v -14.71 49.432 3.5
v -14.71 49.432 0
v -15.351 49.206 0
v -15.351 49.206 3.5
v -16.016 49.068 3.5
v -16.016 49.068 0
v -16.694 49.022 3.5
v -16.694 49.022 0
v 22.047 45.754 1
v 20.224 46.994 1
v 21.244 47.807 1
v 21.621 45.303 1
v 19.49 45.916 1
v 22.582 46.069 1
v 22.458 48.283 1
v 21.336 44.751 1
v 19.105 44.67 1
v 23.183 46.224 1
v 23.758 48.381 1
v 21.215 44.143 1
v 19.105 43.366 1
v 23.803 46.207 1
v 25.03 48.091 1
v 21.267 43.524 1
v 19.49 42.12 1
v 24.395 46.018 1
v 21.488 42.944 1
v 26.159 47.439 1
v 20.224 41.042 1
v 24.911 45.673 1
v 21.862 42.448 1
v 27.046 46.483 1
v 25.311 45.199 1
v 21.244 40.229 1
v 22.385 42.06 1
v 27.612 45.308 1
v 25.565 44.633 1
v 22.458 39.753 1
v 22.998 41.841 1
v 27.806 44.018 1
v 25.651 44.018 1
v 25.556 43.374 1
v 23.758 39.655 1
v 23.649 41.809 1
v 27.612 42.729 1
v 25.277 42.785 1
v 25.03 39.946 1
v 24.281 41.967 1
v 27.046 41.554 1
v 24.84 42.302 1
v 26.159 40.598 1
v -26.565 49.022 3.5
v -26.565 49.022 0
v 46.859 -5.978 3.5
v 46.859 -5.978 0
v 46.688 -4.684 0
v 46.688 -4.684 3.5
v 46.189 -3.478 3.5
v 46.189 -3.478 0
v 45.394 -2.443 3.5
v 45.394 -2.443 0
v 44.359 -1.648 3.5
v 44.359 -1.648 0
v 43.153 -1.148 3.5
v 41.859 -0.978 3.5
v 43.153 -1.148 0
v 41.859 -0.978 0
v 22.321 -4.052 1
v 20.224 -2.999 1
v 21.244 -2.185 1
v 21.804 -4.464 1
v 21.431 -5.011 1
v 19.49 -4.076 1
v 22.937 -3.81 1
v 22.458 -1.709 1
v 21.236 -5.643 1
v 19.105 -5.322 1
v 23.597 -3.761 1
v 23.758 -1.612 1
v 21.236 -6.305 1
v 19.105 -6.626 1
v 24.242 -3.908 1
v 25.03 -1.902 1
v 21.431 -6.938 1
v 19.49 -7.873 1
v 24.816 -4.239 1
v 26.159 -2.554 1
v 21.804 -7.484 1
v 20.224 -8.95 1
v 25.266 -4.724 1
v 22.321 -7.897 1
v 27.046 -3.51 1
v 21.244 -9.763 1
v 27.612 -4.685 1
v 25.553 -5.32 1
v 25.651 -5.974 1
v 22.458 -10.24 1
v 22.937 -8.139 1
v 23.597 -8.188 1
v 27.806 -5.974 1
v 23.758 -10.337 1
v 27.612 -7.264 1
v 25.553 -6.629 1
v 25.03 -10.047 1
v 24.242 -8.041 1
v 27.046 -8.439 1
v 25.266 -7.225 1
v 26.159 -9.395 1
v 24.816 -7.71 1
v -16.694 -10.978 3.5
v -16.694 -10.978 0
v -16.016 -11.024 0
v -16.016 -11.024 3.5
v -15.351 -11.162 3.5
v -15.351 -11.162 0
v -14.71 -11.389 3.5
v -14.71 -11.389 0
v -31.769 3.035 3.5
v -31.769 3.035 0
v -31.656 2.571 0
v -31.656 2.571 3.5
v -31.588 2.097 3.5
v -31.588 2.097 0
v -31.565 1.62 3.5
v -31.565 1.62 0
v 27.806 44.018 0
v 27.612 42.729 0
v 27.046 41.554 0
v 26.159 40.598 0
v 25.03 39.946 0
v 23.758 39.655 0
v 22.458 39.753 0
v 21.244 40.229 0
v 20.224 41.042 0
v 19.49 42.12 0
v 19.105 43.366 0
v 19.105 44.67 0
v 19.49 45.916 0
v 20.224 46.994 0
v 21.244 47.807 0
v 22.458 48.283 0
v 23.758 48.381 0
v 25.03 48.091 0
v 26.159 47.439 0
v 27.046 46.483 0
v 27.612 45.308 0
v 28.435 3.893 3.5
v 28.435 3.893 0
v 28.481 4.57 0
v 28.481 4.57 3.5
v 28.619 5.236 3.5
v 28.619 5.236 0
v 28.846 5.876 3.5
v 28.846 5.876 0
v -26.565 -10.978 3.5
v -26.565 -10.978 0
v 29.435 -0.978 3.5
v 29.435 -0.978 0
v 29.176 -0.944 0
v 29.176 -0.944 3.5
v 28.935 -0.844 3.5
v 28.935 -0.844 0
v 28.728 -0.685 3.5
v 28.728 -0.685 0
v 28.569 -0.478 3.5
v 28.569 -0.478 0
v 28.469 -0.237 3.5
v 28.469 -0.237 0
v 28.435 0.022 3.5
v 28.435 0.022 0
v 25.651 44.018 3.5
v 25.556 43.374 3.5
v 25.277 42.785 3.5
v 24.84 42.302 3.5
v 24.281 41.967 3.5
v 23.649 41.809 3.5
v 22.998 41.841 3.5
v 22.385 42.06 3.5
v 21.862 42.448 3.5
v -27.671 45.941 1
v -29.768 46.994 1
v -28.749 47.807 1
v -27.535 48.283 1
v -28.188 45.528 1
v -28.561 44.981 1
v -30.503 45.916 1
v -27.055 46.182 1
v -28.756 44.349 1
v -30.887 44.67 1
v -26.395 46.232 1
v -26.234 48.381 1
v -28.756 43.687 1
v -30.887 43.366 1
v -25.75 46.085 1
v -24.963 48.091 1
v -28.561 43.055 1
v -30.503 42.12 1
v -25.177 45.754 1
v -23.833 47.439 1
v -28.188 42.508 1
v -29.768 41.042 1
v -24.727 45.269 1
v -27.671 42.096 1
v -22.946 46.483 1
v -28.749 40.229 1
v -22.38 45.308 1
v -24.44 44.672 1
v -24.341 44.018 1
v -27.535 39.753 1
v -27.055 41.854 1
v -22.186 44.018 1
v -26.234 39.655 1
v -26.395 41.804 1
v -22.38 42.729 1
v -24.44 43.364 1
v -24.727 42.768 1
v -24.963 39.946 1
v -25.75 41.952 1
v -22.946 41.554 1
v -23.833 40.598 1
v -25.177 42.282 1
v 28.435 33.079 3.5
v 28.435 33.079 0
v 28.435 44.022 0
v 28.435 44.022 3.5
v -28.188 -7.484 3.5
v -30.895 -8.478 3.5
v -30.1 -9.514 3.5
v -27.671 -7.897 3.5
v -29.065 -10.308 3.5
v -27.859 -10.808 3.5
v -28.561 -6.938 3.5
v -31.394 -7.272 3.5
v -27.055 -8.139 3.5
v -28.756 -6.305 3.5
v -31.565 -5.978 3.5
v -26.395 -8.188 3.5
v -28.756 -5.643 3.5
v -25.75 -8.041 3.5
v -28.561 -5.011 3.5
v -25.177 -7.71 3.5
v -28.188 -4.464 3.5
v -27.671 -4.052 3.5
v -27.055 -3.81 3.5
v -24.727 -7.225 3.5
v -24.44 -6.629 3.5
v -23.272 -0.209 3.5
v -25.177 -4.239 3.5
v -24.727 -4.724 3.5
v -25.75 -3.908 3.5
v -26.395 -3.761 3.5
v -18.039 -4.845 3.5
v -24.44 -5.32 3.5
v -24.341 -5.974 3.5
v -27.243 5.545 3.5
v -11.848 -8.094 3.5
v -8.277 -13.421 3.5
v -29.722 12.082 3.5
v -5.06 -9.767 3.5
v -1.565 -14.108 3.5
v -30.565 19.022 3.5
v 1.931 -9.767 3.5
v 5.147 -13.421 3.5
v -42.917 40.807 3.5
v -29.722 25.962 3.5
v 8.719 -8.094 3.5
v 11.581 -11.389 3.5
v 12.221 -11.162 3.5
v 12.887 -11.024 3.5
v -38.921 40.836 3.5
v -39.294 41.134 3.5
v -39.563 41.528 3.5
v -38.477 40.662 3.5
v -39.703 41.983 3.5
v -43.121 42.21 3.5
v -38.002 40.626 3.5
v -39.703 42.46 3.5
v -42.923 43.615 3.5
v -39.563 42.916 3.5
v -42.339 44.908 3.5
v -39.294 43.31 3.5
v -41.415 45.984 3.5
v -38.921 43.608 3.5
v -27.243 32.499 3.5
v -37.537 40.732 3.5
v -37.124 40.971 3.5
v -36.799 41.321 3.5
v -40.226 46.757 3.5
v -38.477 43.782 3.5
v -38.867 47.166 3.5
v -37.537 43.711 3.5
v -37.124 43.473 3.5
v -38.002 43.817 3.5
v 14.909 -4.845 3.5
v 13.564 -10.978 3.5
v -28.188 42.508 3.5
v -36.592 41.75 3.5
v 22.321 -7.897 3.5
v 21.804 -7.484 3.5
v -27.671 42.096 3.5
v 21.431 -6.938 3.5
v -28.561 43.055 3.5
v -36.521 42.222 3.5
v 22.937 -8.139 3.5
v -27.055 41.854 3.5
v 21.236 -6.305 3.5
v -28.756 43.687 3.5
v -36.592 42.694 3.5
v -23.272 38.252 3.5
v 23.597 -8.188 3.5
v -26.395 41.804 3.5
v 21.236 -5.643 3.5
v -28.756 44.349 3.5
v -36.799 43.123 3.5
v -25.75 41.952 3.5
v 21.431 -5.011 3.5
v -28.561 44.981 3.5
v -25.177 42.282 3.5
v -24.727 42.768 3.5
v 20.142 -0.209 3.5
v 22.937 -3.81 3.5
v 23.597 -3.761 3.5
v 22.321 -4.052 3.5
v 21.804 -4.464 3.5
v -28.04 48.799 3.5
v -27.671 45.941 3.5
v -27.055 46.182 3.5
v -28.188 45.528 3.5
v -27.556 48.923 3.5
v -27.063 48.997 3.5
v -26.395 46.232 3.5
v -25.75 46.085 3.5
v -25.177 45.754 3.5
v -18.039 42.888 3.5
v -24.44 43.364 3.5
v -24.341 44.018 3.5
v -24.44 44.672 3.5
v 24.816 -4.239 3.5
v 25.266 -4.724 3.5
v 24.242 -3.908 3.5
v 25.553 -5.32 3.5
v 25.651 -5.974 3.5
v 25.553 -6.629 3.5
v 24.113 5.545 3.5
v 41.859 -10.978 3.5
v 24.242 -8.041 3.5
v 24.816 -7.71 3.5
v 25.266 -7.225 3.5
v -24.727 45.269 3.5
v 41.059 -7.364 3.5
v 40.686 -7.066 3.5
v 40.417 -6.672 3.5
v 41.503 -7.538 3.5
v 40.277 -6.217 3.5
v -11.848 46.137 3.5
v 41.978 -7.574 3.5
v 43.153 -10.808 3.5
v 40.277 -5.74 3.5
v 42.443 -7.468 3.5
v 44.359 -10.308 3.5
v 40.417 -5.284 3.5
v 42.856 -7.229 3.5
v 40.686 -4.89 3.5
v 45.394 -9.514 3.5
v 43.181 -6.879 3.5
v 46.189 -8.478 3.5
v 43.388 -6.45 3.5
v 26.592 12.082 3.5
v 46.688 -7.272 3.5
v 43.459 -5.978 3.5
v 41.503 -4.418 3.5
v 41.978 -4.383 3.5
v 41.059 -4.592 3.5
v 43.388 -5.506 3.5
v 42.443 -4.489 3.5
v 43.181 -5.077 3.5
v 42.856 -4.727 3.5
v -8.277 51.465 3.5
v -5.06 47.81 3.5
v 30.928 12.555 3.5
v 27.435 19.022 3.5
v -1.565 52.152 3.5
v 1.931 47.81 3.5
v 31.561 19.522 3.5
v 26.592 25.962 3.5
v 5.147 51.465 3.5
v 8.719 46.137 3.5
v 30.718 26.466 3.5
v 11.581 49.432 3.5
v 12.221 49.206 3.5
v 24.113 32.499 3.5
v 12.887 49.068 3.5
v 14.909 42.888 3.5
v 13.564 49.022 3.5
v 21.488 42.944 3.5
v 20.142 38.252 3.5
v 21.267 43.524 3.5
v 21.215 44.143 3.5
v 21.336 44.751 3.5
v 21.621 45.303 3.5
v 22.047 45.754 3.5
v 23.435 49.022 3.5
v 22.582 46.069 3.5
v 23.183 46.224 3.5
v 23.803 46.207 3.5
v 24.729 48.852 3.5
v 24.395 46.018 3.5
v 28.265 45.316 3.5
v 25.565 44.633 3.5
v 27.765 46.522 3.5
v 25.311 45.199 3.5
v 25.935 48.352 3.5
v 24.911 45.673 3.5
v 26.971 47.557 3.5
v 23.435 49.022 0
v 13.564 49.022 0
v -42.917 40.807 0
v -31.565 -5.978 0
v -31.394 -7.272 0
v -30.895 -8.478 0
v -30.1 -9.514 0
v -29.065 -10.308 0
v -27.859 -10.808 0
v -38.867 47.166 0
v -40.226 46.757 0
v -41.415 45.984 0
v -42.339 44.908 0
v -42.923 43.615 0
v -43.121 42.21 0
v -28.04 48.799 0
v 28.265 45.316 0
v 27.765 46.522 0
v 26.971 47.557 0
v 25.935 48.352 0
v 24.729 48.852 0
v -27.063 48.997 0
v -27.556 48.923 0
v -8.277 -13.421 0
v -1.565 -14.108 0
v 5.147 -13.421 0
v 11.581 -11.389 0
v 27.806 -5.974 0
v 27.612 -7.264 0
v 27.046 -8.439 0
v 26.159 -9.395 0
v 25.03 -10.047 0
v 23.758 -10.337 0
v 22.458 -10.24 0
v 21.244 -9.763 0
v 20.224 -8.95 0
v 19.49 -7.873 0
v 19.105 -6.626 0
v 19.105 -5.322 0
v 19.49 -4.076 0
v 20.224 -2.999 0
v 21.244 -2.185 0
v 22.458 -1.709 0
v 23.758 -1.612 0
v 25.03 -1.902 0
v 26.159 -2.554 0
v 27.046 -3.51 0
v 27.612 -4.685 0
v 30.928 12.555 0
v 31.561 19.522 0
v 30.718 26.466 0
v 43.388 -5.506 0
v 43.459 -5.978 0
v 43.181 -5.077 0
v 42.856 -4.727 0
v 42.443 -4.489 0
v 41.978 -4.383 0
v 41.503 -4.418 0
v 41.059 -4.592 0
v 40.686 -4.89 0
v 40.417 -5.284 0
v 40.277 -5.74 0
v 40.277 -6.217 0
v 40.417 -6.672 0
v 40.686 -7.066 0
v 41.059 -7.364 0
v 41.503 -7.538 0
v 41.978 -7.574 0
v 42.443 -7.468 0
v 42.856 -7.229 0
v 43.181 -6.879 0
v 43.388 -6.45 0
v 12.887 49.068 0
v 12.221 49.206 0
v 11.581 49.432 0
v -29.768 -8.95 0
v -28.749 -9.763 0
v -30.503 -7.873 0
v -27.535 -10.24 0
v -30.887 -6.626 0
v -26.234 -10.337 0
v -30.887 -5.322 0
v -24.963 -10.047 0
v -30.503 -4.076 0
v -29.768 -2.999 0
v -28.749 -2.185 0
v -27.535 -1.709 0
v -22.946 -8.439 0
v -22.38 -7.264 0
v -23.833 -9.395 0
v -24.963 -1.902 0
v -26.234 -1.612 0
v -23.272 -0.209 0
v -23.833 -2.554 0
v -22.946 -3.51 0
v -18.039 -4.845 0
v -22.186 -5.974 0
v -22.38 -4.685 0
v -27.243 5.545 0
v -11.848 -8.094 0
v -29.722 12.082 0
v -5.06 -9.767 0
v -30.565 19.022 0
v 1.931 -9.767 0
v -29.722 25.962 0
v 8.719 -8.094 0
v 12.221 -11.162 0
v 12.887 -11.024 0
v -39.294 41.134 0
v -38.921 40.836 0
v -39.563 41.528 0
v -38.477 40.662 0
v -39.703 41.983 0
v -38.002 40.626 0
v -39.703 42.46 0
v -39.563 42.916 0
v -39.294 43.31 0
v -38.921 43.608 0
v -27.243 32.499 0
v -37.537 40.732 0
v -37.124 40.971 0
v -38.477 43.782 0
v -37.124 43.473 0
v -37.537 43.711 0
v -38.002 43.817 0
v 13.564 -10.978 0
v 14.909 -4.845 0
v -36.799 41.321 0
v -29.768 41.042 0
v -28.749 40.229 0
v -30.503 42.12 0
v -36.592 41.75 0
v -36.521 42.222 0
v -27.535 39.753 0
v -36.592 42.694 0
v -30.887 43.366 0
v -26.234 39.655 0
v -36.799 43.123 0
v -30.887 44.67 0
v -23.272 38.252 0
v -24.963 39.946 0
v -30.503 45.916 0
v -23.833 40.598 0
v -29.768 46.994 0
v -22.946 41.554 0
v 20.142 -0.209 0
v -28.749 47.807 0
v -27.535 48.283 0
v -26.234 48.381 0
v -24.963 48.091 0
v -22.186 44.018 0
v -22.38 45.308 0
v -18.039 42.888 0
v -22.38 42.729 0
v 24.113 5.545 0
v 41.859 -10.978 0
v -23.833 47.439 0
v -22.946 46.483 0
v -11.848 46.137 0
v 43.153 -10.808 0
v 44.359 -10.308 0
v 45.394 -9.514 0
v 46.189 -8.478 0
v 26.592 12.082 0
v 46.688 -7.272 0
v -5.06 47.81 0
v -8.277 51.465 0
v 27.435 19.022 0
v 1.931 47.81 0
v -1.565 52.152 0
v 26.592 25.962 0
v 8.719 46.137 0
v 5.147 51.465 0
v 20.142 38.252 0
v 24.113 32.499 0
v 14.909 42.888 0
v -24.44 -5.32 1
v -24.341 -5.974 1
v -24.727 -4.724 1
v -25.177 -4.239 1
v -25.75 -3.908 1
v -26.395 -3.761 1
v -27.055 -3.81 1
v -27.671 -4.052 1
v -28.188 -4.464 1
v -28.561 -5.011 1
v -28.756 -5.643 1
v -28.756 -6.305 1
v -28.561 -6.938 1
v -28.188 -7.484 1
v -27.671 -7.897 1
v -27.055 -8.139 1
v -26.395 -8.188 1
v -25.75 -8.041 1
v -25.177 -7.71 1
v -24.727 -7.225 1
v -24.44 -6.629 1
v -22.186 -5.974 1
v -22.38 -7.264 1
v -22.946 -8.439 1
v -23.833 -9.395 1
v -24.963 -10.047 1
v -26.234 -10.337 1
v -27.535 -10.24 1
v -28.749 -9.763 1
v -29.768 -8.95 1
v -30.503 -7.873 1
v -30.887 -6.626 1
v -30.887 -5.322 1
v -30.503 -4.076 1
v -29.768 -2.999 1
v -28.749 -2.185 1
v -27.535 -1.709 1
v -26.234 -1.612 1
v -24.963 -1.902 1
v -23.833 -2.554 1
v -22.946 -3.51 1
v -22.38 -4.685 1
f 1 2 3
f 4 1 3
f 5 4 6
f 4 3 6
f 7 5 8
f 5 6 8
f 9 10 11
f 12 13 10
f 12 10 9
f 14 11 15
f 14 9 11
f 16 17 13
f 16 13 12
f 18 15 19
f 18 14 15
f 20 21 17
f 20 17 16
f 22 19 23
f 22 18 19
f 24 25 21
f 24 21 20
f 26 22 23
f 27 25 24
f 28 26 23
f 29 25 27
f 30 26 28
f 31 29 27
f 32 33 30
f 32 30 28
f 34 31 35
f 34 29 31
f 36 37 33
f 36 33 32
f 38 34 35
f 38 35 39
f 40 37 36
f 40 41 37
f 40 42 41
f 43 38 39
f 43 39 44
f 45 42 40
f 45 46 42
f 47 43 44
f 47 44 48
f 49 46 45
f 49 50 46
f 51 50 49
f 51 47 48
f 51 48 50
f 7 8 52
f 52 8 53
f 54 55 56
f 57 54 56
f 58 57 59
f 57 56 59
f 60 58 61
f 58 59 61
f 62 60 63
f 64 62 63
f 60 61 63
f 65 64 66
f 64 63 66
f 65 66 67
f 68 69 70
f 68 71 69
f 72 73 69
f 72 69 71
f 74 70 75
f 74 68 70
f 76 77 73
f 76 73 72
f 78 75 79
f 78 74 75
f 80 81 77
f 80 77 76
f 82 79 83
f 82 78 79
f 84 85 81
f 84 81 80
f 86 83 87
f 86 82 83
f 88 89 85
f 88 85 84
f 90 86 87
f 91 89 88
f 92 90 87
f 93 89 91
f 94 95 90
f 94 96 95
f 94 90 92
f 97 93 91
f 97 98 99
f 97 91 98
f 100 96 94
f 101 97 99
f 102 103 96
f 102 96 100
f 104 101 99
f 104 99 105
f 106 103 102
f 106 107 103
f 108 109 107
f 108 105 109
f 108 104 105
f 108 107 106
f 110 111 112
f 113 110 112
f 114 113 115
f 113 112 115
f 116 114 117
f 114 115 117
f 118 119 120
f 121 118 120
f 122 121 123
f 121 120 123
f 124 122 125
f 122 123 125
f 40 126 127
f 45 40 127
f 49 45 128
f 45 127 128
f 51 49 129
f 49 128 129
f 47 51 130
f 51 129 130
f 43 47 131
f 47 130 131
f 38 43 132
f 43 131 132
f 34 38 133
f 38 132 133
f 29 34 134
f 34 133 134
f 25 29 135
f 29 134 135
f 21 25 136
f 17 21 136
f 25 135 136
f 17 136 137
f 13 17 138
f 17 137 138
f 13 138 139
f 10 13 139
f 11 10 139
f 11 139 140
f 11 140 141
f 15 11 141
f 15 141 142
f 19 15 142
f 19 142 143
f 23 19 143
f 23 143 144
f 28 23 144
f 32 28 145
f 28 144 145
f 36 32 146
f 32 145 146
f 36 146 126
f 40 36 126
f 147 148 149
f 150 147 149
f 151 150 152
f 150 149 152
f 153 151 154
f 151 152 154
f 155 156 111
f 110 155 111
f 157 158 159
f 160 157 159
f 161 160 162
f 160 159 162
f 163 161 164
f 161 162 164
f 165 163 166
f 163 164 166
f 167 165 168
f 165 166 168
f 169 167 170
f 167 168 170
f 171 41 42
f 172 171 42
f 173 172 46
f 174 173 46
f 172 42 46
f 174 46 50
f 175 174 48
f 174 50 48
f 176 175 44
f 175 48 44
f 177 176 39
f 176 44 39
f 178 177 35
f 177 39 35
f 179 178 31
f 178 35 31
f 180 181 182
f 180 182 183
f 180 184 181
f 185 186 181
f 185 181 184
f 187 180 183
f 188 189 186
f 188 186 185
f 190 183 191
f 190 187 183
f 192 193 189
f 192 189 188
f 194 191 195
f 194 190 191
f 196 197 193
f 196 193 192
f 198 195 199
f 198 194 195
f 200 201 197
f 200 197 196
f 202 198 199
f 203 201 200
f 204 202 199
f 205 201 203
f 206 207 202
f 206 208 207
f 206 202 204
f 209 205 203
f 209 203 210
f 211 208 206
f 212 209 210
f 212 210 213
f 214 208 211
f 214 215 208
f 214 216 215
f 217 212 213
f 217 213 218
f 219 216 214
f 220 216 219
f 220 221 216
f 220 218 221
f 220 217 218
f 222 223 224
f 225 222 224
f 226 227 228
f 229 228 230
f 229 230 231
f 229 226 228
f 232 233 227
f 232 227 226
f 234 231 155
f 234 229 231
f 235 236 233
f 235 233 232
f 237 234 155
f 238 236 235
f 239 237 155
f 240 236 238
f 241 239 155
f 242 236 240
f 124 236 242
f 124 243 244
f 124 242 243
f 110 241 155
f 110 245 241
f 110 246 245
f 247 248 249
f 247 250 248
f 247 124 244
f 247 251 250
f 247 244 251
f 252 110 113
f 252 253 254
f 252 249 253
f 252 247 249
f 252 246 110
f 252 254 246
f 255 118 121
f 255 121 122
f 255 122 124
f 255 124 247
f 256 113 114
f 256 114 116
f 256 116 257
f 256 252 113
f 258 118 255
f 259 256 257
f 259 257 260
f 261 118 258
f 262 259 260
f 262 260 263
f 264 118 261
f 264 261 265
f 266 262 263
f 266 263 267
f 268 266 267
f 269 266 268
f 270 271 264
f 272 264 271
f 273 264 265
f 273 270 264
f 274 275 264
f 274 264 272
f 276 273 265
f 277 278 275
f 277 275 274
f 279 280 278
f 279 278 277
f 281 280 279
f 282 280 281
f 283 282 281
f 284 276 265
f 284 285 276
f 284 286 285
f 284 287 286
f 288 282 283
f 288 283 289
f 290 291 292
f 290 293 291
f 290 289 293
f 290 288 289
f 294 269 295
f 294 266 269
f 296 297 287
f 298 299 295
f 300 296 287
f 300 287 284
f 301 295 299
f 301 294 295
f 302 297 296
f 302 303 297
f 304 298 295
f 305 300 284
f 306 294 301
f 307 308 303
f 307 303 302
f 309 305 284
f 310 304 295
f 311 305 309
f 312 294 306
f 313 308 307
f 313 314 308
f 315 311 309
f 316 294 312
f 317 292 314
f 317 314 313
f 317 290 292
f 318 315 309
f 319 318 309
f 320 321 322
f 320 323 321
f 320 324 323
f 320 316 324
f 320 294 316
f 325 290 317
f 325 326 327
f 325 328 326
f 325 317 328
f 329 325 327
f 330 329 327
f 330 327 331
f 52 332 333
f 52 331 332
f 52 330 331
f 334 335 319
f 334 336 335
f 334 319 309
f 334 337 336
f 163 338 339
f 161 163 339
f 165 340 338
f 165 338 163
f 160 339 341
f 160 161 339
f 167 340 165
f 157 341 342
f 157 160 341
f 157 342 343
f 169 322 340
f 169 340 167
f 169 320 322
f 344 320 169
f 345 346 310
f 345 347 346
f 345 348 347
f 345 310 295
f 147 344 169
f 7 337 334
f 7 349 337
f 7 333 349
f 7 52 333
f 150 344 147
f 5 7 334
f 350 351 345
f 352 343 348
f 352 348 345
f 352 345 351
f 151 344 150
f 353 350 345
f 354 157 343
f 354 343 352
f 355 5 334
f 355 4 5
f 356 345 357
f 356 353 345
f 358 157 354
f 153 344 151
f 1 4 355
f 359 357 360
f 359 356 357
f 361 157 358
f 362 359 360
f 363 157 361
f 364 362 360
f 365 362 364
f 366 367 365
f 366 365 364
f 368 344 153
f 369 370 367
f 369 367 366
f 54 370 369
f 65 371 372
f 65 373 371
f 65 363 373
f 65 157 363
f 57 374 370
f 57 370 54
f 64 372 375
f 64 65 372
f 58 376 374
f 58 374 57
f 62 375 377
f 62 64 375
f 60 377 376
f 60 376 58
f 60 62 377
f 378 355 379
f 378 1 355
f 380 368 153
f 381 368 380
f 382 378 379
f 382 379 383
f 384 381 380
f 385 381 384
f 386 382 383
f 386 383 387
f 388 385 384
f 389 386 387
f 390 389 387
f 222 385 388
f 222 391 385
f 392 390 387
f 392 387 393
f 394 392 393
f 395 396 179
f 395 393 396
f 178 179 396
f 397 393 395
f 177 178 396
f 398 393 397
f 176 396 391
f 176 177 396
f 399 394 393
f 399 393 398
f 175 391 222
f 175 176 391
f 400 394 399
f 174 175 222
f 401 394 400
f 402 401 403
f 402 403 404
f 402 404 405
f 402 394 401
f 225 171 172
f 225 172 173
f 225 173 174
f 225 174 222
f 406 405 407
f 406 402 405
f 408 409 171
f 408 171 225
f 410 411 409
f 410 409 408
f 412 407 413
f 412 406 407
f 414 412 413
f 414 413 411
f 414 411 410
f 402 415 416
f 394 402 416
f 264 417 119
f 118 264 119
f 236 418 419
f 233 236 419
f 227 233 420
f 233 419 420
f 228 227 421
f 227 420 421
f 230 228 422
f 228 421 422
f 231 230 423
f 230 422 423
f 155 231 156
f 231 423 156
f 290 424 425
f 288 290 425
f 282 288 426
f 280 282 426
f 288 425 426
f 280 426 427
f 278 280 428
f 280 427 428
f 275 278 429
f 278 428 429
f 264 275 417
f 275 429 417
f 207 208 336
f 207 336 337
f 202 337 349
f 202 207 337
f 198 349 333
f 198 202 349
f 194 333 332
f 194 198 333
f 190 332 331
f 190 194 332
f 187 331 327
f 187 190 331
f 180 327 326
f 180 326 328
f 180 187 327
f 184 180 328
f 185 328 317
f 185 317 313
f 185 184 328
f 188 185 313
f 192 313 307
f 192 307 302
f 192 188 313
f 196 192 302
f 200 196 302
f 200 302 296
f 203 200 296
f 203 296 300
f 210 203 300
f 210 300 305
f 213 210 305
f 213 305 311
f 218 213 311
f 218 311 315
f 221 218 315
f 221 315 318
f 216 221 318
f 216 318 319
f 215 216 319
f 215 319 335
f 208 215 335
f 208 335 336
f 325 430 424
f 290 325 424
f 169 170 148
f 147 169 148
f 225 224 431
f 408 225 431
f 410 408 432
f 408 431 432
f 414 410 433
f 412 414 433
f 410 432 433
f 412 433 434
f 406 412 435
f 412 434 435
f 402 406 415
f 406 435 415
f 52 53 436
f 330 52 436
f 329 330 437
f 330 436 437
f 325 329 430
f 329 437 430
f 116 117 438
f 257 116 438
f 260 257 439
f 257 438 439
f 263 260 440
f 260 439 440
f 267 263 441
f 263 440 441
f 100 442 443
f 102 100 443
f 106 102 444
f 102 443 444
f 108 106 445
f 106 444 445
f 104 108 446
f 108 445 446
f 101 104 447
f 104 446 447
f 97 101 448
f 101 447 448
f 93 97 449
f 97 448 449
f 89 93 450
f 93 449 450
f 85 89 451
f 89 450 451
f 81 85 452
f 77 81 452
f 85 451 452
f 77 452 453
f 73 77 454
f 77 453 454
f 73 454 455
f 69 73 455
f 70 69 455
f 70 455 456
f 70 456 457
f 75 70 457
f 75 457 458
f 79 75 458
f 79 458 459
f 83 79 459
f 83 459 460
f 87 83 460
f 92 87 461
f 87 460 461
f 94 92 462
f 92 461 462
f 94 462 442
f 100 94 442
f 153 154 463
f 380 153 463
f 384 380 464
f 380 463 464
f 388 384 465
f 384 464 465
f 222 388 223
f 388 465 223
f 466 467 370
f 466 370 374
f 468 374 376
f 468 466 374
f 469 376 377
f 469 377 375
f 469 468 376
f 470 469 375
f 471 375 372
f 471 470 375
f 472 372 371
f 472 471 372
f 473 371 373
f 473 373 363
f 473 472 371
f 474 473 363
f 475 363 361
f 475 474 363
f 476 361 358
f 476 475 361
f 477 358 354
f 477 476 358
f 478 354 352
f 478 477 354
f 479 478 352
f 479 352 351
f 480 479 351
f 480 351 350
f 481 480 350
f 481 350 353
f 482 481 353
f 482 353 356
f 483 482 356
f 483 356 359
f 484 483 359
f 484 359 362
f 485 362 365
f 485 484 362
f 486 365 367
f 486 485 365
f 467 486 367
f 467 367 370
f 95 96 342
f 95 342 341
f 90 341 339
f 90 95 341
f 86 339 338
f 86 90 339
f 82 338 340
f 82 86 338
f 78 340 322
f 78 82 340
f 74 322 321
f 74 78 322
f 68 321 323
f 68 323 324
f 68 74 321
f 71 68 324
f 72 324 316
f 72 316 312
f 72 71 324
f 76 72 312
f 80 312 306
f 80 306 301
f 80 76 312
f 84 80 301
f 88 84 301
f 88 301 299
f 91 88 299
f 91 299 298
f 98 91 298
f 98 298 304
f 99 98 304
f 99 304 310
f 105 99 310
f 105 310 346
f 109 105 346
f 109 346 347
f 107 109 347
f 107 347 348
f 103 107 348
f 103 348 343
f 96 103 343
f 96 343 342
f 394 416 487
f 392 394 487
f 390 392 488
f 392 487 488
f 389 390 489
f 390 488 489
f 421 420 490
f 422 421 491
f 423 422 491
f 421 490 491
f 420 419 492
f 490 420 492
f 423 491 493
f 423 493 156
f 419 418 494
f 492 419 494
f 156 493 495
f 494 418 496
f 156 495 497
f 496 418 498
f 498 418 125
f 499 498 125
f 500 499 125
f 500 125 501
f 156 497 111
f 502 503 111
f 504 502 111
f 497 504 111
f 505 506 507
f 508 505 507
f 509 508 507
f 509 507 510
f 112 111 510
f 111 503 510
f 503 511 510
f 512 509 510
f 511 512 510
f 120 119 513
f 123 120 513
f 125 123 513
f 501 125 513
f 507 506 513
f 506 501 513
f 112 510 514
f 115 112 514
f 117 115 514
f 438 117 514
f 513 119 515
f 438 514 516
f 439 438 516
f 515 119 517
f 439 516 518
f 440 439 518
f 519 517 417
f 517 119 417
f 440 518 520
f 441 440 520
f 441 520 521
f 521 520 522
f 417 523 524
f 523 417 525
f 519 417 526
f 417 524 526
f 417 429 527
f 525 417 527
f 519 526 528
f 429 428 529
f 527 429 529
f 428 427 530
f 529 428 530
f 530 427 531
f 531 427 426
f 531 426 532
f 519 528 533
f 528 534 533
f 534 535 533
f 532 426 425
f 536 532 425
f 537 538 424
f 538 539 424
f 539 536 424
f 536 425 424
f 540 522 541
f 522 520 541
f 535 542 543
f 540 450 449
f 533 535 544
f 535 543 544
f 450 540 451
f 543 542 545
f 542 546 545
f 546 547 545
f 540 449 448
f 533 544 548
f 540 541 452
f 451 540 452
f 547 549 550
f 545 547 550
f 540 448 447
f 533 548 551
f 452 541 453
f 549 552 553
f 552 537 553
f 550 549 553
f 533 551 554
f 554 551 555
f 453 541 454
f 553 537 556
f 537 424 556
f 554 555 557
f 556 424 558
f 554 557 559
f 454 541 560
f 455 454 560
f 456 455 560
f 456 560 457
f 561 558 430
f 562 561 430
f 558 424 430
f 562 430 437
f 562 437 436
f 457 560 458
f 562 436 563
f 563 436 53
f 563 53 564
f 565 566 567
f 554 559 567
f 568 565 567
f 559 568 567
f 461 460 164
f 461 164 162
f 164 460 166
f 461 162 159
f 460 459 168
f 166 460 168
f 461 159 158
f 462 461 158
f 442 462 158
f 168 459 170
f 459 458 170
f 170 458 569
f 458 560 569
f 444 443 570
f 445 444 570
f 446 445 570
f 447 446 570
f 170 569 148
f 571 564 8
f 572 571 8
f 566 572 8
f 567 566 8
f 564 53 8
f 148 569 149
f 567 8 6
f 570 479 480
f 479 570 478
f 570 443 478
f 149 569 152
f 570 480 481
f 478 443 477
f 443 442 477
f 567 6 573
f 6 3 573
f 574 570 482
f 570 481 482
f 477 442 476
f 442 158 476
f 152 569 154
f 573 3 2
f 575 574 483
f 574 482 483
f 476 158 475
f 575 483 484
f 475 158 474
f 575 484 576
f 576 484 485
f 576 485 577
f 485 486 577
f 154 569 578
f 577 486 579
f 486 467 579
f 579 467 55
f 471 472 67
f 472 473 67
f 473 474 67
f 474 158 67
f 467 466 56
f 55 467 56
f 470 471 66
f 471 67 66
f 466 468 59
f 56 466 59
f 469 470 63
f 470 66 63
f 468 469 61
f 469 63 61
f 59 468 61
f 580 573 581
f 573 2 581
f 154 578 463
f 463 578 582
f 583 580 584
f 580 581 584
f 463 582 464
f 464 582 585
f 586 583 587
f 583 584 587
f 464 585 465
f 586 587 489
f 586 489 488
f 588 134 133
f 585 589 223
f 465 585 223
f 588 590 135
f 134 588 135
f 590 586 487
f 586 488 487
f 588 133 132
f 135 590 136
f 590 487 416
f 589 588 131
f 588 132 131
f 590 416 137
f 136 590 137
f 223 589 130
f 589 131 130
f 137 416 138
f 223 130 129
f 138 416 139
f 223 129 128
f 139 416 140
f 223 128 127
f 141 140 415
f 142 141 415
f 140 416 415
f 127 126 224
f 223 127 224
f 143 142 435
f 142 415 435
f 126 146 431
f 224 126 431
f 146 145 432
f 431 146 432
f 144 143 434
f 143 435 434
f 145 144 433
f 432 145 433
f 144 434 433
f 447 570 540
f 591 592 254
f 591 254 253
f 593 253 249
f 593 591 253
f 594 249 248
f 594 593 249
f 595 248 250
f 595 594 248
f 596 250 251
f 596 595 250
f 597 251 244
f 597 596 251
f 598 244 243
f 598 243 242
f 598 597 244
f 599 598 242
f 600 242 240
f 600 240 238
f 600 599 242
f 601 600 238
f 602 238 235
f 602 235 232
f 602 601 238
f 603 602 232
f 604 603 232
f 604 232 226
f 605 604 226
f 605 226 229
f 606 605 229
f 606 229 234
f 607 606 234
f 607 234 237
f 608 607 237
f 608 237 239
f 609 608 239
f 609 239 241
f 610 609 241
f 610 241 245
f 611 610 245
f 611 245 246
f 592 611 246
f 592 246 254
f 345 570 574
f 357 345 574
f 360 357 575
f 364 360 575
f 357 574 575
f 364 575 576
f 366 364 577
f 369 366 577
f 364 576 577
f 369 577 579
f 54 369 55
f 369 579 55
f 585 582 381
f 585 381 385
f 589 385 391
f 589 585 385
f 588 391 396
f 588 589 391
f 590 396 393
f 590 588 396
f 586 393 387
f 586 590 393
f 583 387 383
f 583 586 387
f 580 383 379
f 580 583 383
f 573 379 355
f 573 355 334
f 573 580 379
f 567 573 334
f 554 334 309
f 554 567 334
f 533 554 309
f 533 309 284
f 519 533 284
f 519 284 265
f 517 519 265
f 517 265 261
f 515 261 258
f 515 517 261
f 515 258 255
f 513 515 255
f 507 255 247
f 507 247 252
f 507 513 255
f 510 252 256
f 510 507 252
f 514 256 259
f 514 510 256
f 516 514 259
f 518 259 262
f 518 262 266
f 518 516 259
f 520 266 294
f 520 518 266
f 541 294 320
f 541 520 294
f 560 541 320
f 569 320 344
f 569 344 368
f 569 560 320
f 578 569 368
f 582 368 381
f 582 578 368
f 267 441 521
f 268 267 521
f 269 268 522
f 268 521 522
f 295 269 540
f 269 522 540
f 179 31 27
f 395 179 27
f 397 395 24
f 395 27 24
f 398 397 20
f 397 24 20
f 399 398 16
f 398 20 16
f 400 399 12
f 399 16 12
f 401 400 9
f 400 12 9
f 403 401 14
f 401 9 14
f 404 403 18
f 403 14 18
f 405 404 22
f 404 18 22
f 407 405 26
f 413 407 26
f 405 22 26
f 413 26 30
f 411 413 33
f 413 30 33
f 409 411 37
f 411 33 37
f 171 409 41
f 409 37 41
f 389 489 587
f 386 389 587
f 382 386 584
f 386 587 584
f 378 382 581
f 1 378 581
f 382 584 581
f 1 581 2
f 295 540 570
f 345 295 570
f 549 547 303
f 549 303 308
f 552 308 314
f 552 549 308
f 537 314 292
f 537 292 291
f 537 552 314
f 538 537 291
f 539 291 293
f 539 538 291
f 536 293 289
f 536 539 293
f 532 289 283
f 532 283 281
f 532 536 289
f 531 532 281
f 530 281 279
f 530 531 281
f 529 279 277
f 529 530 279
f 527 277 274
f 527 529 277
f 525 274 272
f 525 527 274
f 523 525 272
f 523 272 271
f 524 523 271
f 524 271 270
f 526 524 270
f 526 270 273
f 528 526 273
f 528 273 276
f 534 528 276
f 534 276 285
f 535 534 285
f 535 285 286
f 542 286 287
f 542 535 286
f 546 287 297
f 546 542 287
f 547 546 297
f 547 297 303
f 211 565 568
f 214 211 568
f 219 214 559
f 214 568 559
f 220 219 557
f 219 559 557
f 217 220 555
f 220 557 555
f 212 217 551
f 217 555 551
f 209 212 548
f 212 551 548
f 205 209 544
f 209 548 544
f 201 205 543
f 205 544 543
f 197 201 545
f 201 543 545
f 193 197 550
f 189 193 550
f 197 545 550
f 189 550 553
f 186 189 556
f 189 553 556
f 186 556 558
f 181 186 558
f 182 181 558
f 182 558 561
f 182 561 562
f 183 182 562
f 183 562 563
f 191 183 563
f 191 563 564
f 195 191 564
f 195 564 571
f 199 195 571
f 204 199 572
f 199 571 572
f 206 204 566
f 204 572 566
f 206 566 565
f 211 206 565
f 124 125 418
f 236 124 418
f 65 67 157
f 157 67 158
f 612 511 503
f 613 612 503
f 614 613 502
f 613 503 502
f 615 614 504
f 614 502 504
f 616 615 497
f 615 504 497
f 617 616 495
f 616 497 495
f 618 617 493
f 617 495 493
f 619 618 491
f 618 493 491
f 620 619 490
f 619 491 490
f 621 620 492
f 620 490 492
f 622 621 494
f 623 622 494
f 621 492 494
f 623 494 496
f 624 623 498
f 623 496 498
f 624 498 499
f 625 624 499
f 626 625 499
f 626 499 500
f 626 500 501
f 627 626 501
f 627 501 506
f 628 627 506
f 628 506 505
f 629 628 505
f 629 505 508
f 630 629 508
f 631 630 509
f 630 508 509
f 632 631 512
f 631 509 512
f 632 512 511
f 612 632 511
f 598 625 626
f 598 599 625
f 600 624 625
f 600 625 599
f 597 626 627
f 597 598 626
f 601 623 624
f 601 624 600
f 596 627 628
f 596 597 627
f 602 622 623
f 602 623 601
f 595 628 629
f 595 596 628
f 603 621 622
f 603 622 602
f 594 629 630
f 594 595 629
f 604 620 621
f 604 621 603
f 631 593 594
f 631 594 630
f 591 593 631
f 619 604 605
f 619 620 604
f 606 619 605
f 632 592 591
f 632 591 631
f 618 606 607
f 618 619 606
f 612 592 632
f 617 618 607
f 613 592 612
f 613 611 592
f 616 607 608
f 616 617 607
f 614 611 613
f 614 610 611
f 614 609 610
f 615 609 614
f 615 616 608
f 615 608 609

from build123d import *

# Parameters (mm, degrees)
F0_R     = 2.22
F0_R_2   = 29
F0_R_3   = 1.6
F2_DEPTH = 3.5
F3_R     = 4.375
F3_R_2   = 2.22
F4_DEPTH = 1


with BuildPart() as f2:
    # F0 (on Top) → F2 (new body)
    with BuildSketch(Plane.XY):
        with BuildLine():
            Line((-28.0399272842, 48.7993610323), (-26.564868493, 49.0218929201))
            ThreePointArc((-26.564868493, 49.0218929201), (-27.3107436298, 48.965946953), (-28.0399272842, 48.7993610323))
        make_face()
        with BuildLine():
            Line((-16.69420754, 49.0218929201), (-26.564868493, 49.0218929201))
            Line((-26.564868493, 49.0218929201), (-28.0399272842, 48.7993610323))
            Line((-28.0399272842, 48.7993610323), (-38.8670578152, 47.165946953))
            ThreePointArc((-38.8670578152, 47.165946953), (-42.3386518344, 44.9075872285), (-42.9166986895, 40.8066098434))
            Line((-42.9166986895, 40.8066098434), (-31.7693524819, 3.0351716781))
            ThreePointArc((-31.7693524819, 3.0351716781), (-31.6162535325, 2.3348780924), (-31.564868493, 1.6198886013))
            Line((-31.564868493, 1.6198886013), (-31.564868493, -5.9781070799))
            ThreePointArc((-31.564868493, -5.9781070799), (-30.1004023989, -9.5136409858), (-26.564868493, -10.9781070799))
            Line((-26.564868493, -10.9781070799), (-16.69420754, -10.9781070799))
            ThreePointArc((-16.69420754, -10.9781070799), (-15.6812440963, -11.0817916221), (-14.7102921129, -11.3885450552))
            ThreePointArc((-14.7102921129, -11.3885450552), (-1.564868493, -14.1081070799), (11.5805551269, -11.3885450552))
            ThreePointArc((11.5805551269, -11.3885450552), (12.5515071103, -11.0817916221), (13.564470554, -10.9781070799))
            Line((13.564470554, -10.9781070799), (23.435131507, -10.9781070799))
            Line((23.435131507, -10.9781070799), (41.8588173216, -10.9781070799))
            ThreePointArc((41.8588173216, -10.9781070799), (39.4580409401, -10.3640246311), (37.6469744143, -8.6726161862))
            ThreePointArc((37.6469744143, -8.6726161862), (37.5867252108, -8.5760349073), (37.5286903027, -8.4781070799))
            ThreePointArc((37.5286903027, -8.4781070799), (37.5286903027, -3.4781070799), (41.8588173216, -0.9781070799))
            Line((41.8588173216, -0.9781070799), (29.435131507, -0.9781070799))
            ThreePointArc((29.435131507, -0.9781070799), (28.7280247258, -0.6852138611), (28.435131507, 0.0218929201))
            Line((28.435131507, 0.0218929201), (28.435131507, 3.8925538731))
            ThreePointArc((28.435131507, 3.8925538731), (28.5388160493, 4.9055173169), (28.8455694823, 5.8764693002))
            ThreePointArc((28.8455694823, 5.8764693002), (31.5613609993, 19.521712514), (28.435131507, 33.0788093672))
            Line((28.435131507, 33.0788093672), (28.435131507, 44.0218929201))
            ThreePointArc((28.435131507, 44.0218929201), (26.9706654129, 47.5574268261), (23.435131507, 49.0218929201))
            Line((23.435131507, 49.0218929201), (13.564470554, 49.0218929201))
            ThreePointArc((13.564470554, 49.0218929201), (12.5515071103, 49.1255774624), (11.5805551269, 49.4323308955))
            ThreePointArc((11.5805551269, 49.4323308955), (-1.564868493, 52.1518929201), (-14.7102921129, 49.4323308955))
            ThreePointArc((-14.7102921129, 49.4323308955), (-15.6812440963, 49.1255774624), (-16.69420754, 49.0218929201))
        make_face()
        with Locations((-26.5610932079, -5.9743317948)):
            Circle(F0_R, mode=Mode.SUBTRACT)
        with Locations((23.4313562219, -5.9743317948)):
            Circle(F0_R, mode=Mode.SUBTRACT)
        with Locations((-1.564868493, 19.0218929201)):
            Circle(F0_R_2, mode=Mode.SUBTRACT)
        with Locations((-38.1211826784, 42.2218929201)):
            Circle(F0_R_3, mode=Mode.SUBTRACT)
        with Locations((-26.561093208, 44.0181176351)):
            Circle(F0_R, mode=Mode.SUBTRACT)
        with BuildLine():
            ThreePointArc((25.6513562219, 44.0181176351), (24.2809134408, 41.9671050725), (21.8615791662, 42.4483405824))
            ThreePointArc((21.8615791662, 42.4483405824), (22.5817990031, 46.0691301977), (25.6513562219, 44.0181176351))
        make_face(mode=Mode.SUBTRACT)
        with BuildLine():
            ThreePointArc((46.8588173216, -5.9781070799), (45.3943512276, -2.4425731739), (41.8588173216, -0.9781070799))
            ThreePointArc((41.8588173216, -0.9781070799), (37.5286903027, -3.4781070799), (37.5286903027, -8.4781070799))
            ThreePointArc((37.5286903027, -8.4781070799), (37.5867252108, -8.5760349073), (37.6469744143, -8.6726161862))
            ThreePointArc((37.6469744143, -8.6726161862), (39.4580409401, -10.3640246311), (41.8588173216, -10.9781070799))
            ThreePointArc((41.8588173216, -10.9781070799), (45.3943512276, -9.5136409858), (46.8588173216, -5.9781070799))
        make_face()
        with Locations((41.8588173216, -5.9781070799)):
            Circle(F0_R_3, mode=Mode.SUBTRACT)
    extrude(amount=F2_DEPTH)

    # F3 (on face) → F4 (cut)
    with BuildSketch(Plane(origin=(0, 0, 0), x_dir=(1, 0, 0), z_dir=(0, 0, -1))):
        with Locations((23.4313562219, 5.9743317948)):
            Circle(F3_R)
        with Locations((23.4313562219, 5.9743317948)):
            Circle(F3_R_2, mode=Mode.SUBTRACT)
        with Locations((-26.5610932079, 5.9743317948)):
            Circle(F3_R)
        with Locations((-26.5610932079, 5.9743317948)):
            Circle(F3_R_2, mode=Mode.SUBTRACT)
        with Locations((-26.561093208, -44.0181176351)):
            Circle(F3_R)
        with Locations((-26.561093208, -44.0181176351)):
            Circle(F3_R_2, mode=Mode.SUBTRACT)
        with Locations((23.4313562219, -44.0181176351)):
            Circle(F3_R)
        with Locations((23.4313562219, -44.0181176351)):
            Circle(F3_R_2, mode=Mode.SUBTRACT)
        with Locations((-26.5610932079, 5.9743317948)):
            Circle(F3_R_2)
        with Locations((23.4313562219, 5.9743317948)):
            Circle(F3_R_2)
        with Locations((23.4313562219, -44.0181176351)):
            Circle(F3_R_2)
        with Locations((-26.561093208, -44.0181176351)):
            Circle(F3_R_2)
    extrude(amount=-F4_DEPTH, mode=Mode.SUBTRACT)


solid = f2.part
